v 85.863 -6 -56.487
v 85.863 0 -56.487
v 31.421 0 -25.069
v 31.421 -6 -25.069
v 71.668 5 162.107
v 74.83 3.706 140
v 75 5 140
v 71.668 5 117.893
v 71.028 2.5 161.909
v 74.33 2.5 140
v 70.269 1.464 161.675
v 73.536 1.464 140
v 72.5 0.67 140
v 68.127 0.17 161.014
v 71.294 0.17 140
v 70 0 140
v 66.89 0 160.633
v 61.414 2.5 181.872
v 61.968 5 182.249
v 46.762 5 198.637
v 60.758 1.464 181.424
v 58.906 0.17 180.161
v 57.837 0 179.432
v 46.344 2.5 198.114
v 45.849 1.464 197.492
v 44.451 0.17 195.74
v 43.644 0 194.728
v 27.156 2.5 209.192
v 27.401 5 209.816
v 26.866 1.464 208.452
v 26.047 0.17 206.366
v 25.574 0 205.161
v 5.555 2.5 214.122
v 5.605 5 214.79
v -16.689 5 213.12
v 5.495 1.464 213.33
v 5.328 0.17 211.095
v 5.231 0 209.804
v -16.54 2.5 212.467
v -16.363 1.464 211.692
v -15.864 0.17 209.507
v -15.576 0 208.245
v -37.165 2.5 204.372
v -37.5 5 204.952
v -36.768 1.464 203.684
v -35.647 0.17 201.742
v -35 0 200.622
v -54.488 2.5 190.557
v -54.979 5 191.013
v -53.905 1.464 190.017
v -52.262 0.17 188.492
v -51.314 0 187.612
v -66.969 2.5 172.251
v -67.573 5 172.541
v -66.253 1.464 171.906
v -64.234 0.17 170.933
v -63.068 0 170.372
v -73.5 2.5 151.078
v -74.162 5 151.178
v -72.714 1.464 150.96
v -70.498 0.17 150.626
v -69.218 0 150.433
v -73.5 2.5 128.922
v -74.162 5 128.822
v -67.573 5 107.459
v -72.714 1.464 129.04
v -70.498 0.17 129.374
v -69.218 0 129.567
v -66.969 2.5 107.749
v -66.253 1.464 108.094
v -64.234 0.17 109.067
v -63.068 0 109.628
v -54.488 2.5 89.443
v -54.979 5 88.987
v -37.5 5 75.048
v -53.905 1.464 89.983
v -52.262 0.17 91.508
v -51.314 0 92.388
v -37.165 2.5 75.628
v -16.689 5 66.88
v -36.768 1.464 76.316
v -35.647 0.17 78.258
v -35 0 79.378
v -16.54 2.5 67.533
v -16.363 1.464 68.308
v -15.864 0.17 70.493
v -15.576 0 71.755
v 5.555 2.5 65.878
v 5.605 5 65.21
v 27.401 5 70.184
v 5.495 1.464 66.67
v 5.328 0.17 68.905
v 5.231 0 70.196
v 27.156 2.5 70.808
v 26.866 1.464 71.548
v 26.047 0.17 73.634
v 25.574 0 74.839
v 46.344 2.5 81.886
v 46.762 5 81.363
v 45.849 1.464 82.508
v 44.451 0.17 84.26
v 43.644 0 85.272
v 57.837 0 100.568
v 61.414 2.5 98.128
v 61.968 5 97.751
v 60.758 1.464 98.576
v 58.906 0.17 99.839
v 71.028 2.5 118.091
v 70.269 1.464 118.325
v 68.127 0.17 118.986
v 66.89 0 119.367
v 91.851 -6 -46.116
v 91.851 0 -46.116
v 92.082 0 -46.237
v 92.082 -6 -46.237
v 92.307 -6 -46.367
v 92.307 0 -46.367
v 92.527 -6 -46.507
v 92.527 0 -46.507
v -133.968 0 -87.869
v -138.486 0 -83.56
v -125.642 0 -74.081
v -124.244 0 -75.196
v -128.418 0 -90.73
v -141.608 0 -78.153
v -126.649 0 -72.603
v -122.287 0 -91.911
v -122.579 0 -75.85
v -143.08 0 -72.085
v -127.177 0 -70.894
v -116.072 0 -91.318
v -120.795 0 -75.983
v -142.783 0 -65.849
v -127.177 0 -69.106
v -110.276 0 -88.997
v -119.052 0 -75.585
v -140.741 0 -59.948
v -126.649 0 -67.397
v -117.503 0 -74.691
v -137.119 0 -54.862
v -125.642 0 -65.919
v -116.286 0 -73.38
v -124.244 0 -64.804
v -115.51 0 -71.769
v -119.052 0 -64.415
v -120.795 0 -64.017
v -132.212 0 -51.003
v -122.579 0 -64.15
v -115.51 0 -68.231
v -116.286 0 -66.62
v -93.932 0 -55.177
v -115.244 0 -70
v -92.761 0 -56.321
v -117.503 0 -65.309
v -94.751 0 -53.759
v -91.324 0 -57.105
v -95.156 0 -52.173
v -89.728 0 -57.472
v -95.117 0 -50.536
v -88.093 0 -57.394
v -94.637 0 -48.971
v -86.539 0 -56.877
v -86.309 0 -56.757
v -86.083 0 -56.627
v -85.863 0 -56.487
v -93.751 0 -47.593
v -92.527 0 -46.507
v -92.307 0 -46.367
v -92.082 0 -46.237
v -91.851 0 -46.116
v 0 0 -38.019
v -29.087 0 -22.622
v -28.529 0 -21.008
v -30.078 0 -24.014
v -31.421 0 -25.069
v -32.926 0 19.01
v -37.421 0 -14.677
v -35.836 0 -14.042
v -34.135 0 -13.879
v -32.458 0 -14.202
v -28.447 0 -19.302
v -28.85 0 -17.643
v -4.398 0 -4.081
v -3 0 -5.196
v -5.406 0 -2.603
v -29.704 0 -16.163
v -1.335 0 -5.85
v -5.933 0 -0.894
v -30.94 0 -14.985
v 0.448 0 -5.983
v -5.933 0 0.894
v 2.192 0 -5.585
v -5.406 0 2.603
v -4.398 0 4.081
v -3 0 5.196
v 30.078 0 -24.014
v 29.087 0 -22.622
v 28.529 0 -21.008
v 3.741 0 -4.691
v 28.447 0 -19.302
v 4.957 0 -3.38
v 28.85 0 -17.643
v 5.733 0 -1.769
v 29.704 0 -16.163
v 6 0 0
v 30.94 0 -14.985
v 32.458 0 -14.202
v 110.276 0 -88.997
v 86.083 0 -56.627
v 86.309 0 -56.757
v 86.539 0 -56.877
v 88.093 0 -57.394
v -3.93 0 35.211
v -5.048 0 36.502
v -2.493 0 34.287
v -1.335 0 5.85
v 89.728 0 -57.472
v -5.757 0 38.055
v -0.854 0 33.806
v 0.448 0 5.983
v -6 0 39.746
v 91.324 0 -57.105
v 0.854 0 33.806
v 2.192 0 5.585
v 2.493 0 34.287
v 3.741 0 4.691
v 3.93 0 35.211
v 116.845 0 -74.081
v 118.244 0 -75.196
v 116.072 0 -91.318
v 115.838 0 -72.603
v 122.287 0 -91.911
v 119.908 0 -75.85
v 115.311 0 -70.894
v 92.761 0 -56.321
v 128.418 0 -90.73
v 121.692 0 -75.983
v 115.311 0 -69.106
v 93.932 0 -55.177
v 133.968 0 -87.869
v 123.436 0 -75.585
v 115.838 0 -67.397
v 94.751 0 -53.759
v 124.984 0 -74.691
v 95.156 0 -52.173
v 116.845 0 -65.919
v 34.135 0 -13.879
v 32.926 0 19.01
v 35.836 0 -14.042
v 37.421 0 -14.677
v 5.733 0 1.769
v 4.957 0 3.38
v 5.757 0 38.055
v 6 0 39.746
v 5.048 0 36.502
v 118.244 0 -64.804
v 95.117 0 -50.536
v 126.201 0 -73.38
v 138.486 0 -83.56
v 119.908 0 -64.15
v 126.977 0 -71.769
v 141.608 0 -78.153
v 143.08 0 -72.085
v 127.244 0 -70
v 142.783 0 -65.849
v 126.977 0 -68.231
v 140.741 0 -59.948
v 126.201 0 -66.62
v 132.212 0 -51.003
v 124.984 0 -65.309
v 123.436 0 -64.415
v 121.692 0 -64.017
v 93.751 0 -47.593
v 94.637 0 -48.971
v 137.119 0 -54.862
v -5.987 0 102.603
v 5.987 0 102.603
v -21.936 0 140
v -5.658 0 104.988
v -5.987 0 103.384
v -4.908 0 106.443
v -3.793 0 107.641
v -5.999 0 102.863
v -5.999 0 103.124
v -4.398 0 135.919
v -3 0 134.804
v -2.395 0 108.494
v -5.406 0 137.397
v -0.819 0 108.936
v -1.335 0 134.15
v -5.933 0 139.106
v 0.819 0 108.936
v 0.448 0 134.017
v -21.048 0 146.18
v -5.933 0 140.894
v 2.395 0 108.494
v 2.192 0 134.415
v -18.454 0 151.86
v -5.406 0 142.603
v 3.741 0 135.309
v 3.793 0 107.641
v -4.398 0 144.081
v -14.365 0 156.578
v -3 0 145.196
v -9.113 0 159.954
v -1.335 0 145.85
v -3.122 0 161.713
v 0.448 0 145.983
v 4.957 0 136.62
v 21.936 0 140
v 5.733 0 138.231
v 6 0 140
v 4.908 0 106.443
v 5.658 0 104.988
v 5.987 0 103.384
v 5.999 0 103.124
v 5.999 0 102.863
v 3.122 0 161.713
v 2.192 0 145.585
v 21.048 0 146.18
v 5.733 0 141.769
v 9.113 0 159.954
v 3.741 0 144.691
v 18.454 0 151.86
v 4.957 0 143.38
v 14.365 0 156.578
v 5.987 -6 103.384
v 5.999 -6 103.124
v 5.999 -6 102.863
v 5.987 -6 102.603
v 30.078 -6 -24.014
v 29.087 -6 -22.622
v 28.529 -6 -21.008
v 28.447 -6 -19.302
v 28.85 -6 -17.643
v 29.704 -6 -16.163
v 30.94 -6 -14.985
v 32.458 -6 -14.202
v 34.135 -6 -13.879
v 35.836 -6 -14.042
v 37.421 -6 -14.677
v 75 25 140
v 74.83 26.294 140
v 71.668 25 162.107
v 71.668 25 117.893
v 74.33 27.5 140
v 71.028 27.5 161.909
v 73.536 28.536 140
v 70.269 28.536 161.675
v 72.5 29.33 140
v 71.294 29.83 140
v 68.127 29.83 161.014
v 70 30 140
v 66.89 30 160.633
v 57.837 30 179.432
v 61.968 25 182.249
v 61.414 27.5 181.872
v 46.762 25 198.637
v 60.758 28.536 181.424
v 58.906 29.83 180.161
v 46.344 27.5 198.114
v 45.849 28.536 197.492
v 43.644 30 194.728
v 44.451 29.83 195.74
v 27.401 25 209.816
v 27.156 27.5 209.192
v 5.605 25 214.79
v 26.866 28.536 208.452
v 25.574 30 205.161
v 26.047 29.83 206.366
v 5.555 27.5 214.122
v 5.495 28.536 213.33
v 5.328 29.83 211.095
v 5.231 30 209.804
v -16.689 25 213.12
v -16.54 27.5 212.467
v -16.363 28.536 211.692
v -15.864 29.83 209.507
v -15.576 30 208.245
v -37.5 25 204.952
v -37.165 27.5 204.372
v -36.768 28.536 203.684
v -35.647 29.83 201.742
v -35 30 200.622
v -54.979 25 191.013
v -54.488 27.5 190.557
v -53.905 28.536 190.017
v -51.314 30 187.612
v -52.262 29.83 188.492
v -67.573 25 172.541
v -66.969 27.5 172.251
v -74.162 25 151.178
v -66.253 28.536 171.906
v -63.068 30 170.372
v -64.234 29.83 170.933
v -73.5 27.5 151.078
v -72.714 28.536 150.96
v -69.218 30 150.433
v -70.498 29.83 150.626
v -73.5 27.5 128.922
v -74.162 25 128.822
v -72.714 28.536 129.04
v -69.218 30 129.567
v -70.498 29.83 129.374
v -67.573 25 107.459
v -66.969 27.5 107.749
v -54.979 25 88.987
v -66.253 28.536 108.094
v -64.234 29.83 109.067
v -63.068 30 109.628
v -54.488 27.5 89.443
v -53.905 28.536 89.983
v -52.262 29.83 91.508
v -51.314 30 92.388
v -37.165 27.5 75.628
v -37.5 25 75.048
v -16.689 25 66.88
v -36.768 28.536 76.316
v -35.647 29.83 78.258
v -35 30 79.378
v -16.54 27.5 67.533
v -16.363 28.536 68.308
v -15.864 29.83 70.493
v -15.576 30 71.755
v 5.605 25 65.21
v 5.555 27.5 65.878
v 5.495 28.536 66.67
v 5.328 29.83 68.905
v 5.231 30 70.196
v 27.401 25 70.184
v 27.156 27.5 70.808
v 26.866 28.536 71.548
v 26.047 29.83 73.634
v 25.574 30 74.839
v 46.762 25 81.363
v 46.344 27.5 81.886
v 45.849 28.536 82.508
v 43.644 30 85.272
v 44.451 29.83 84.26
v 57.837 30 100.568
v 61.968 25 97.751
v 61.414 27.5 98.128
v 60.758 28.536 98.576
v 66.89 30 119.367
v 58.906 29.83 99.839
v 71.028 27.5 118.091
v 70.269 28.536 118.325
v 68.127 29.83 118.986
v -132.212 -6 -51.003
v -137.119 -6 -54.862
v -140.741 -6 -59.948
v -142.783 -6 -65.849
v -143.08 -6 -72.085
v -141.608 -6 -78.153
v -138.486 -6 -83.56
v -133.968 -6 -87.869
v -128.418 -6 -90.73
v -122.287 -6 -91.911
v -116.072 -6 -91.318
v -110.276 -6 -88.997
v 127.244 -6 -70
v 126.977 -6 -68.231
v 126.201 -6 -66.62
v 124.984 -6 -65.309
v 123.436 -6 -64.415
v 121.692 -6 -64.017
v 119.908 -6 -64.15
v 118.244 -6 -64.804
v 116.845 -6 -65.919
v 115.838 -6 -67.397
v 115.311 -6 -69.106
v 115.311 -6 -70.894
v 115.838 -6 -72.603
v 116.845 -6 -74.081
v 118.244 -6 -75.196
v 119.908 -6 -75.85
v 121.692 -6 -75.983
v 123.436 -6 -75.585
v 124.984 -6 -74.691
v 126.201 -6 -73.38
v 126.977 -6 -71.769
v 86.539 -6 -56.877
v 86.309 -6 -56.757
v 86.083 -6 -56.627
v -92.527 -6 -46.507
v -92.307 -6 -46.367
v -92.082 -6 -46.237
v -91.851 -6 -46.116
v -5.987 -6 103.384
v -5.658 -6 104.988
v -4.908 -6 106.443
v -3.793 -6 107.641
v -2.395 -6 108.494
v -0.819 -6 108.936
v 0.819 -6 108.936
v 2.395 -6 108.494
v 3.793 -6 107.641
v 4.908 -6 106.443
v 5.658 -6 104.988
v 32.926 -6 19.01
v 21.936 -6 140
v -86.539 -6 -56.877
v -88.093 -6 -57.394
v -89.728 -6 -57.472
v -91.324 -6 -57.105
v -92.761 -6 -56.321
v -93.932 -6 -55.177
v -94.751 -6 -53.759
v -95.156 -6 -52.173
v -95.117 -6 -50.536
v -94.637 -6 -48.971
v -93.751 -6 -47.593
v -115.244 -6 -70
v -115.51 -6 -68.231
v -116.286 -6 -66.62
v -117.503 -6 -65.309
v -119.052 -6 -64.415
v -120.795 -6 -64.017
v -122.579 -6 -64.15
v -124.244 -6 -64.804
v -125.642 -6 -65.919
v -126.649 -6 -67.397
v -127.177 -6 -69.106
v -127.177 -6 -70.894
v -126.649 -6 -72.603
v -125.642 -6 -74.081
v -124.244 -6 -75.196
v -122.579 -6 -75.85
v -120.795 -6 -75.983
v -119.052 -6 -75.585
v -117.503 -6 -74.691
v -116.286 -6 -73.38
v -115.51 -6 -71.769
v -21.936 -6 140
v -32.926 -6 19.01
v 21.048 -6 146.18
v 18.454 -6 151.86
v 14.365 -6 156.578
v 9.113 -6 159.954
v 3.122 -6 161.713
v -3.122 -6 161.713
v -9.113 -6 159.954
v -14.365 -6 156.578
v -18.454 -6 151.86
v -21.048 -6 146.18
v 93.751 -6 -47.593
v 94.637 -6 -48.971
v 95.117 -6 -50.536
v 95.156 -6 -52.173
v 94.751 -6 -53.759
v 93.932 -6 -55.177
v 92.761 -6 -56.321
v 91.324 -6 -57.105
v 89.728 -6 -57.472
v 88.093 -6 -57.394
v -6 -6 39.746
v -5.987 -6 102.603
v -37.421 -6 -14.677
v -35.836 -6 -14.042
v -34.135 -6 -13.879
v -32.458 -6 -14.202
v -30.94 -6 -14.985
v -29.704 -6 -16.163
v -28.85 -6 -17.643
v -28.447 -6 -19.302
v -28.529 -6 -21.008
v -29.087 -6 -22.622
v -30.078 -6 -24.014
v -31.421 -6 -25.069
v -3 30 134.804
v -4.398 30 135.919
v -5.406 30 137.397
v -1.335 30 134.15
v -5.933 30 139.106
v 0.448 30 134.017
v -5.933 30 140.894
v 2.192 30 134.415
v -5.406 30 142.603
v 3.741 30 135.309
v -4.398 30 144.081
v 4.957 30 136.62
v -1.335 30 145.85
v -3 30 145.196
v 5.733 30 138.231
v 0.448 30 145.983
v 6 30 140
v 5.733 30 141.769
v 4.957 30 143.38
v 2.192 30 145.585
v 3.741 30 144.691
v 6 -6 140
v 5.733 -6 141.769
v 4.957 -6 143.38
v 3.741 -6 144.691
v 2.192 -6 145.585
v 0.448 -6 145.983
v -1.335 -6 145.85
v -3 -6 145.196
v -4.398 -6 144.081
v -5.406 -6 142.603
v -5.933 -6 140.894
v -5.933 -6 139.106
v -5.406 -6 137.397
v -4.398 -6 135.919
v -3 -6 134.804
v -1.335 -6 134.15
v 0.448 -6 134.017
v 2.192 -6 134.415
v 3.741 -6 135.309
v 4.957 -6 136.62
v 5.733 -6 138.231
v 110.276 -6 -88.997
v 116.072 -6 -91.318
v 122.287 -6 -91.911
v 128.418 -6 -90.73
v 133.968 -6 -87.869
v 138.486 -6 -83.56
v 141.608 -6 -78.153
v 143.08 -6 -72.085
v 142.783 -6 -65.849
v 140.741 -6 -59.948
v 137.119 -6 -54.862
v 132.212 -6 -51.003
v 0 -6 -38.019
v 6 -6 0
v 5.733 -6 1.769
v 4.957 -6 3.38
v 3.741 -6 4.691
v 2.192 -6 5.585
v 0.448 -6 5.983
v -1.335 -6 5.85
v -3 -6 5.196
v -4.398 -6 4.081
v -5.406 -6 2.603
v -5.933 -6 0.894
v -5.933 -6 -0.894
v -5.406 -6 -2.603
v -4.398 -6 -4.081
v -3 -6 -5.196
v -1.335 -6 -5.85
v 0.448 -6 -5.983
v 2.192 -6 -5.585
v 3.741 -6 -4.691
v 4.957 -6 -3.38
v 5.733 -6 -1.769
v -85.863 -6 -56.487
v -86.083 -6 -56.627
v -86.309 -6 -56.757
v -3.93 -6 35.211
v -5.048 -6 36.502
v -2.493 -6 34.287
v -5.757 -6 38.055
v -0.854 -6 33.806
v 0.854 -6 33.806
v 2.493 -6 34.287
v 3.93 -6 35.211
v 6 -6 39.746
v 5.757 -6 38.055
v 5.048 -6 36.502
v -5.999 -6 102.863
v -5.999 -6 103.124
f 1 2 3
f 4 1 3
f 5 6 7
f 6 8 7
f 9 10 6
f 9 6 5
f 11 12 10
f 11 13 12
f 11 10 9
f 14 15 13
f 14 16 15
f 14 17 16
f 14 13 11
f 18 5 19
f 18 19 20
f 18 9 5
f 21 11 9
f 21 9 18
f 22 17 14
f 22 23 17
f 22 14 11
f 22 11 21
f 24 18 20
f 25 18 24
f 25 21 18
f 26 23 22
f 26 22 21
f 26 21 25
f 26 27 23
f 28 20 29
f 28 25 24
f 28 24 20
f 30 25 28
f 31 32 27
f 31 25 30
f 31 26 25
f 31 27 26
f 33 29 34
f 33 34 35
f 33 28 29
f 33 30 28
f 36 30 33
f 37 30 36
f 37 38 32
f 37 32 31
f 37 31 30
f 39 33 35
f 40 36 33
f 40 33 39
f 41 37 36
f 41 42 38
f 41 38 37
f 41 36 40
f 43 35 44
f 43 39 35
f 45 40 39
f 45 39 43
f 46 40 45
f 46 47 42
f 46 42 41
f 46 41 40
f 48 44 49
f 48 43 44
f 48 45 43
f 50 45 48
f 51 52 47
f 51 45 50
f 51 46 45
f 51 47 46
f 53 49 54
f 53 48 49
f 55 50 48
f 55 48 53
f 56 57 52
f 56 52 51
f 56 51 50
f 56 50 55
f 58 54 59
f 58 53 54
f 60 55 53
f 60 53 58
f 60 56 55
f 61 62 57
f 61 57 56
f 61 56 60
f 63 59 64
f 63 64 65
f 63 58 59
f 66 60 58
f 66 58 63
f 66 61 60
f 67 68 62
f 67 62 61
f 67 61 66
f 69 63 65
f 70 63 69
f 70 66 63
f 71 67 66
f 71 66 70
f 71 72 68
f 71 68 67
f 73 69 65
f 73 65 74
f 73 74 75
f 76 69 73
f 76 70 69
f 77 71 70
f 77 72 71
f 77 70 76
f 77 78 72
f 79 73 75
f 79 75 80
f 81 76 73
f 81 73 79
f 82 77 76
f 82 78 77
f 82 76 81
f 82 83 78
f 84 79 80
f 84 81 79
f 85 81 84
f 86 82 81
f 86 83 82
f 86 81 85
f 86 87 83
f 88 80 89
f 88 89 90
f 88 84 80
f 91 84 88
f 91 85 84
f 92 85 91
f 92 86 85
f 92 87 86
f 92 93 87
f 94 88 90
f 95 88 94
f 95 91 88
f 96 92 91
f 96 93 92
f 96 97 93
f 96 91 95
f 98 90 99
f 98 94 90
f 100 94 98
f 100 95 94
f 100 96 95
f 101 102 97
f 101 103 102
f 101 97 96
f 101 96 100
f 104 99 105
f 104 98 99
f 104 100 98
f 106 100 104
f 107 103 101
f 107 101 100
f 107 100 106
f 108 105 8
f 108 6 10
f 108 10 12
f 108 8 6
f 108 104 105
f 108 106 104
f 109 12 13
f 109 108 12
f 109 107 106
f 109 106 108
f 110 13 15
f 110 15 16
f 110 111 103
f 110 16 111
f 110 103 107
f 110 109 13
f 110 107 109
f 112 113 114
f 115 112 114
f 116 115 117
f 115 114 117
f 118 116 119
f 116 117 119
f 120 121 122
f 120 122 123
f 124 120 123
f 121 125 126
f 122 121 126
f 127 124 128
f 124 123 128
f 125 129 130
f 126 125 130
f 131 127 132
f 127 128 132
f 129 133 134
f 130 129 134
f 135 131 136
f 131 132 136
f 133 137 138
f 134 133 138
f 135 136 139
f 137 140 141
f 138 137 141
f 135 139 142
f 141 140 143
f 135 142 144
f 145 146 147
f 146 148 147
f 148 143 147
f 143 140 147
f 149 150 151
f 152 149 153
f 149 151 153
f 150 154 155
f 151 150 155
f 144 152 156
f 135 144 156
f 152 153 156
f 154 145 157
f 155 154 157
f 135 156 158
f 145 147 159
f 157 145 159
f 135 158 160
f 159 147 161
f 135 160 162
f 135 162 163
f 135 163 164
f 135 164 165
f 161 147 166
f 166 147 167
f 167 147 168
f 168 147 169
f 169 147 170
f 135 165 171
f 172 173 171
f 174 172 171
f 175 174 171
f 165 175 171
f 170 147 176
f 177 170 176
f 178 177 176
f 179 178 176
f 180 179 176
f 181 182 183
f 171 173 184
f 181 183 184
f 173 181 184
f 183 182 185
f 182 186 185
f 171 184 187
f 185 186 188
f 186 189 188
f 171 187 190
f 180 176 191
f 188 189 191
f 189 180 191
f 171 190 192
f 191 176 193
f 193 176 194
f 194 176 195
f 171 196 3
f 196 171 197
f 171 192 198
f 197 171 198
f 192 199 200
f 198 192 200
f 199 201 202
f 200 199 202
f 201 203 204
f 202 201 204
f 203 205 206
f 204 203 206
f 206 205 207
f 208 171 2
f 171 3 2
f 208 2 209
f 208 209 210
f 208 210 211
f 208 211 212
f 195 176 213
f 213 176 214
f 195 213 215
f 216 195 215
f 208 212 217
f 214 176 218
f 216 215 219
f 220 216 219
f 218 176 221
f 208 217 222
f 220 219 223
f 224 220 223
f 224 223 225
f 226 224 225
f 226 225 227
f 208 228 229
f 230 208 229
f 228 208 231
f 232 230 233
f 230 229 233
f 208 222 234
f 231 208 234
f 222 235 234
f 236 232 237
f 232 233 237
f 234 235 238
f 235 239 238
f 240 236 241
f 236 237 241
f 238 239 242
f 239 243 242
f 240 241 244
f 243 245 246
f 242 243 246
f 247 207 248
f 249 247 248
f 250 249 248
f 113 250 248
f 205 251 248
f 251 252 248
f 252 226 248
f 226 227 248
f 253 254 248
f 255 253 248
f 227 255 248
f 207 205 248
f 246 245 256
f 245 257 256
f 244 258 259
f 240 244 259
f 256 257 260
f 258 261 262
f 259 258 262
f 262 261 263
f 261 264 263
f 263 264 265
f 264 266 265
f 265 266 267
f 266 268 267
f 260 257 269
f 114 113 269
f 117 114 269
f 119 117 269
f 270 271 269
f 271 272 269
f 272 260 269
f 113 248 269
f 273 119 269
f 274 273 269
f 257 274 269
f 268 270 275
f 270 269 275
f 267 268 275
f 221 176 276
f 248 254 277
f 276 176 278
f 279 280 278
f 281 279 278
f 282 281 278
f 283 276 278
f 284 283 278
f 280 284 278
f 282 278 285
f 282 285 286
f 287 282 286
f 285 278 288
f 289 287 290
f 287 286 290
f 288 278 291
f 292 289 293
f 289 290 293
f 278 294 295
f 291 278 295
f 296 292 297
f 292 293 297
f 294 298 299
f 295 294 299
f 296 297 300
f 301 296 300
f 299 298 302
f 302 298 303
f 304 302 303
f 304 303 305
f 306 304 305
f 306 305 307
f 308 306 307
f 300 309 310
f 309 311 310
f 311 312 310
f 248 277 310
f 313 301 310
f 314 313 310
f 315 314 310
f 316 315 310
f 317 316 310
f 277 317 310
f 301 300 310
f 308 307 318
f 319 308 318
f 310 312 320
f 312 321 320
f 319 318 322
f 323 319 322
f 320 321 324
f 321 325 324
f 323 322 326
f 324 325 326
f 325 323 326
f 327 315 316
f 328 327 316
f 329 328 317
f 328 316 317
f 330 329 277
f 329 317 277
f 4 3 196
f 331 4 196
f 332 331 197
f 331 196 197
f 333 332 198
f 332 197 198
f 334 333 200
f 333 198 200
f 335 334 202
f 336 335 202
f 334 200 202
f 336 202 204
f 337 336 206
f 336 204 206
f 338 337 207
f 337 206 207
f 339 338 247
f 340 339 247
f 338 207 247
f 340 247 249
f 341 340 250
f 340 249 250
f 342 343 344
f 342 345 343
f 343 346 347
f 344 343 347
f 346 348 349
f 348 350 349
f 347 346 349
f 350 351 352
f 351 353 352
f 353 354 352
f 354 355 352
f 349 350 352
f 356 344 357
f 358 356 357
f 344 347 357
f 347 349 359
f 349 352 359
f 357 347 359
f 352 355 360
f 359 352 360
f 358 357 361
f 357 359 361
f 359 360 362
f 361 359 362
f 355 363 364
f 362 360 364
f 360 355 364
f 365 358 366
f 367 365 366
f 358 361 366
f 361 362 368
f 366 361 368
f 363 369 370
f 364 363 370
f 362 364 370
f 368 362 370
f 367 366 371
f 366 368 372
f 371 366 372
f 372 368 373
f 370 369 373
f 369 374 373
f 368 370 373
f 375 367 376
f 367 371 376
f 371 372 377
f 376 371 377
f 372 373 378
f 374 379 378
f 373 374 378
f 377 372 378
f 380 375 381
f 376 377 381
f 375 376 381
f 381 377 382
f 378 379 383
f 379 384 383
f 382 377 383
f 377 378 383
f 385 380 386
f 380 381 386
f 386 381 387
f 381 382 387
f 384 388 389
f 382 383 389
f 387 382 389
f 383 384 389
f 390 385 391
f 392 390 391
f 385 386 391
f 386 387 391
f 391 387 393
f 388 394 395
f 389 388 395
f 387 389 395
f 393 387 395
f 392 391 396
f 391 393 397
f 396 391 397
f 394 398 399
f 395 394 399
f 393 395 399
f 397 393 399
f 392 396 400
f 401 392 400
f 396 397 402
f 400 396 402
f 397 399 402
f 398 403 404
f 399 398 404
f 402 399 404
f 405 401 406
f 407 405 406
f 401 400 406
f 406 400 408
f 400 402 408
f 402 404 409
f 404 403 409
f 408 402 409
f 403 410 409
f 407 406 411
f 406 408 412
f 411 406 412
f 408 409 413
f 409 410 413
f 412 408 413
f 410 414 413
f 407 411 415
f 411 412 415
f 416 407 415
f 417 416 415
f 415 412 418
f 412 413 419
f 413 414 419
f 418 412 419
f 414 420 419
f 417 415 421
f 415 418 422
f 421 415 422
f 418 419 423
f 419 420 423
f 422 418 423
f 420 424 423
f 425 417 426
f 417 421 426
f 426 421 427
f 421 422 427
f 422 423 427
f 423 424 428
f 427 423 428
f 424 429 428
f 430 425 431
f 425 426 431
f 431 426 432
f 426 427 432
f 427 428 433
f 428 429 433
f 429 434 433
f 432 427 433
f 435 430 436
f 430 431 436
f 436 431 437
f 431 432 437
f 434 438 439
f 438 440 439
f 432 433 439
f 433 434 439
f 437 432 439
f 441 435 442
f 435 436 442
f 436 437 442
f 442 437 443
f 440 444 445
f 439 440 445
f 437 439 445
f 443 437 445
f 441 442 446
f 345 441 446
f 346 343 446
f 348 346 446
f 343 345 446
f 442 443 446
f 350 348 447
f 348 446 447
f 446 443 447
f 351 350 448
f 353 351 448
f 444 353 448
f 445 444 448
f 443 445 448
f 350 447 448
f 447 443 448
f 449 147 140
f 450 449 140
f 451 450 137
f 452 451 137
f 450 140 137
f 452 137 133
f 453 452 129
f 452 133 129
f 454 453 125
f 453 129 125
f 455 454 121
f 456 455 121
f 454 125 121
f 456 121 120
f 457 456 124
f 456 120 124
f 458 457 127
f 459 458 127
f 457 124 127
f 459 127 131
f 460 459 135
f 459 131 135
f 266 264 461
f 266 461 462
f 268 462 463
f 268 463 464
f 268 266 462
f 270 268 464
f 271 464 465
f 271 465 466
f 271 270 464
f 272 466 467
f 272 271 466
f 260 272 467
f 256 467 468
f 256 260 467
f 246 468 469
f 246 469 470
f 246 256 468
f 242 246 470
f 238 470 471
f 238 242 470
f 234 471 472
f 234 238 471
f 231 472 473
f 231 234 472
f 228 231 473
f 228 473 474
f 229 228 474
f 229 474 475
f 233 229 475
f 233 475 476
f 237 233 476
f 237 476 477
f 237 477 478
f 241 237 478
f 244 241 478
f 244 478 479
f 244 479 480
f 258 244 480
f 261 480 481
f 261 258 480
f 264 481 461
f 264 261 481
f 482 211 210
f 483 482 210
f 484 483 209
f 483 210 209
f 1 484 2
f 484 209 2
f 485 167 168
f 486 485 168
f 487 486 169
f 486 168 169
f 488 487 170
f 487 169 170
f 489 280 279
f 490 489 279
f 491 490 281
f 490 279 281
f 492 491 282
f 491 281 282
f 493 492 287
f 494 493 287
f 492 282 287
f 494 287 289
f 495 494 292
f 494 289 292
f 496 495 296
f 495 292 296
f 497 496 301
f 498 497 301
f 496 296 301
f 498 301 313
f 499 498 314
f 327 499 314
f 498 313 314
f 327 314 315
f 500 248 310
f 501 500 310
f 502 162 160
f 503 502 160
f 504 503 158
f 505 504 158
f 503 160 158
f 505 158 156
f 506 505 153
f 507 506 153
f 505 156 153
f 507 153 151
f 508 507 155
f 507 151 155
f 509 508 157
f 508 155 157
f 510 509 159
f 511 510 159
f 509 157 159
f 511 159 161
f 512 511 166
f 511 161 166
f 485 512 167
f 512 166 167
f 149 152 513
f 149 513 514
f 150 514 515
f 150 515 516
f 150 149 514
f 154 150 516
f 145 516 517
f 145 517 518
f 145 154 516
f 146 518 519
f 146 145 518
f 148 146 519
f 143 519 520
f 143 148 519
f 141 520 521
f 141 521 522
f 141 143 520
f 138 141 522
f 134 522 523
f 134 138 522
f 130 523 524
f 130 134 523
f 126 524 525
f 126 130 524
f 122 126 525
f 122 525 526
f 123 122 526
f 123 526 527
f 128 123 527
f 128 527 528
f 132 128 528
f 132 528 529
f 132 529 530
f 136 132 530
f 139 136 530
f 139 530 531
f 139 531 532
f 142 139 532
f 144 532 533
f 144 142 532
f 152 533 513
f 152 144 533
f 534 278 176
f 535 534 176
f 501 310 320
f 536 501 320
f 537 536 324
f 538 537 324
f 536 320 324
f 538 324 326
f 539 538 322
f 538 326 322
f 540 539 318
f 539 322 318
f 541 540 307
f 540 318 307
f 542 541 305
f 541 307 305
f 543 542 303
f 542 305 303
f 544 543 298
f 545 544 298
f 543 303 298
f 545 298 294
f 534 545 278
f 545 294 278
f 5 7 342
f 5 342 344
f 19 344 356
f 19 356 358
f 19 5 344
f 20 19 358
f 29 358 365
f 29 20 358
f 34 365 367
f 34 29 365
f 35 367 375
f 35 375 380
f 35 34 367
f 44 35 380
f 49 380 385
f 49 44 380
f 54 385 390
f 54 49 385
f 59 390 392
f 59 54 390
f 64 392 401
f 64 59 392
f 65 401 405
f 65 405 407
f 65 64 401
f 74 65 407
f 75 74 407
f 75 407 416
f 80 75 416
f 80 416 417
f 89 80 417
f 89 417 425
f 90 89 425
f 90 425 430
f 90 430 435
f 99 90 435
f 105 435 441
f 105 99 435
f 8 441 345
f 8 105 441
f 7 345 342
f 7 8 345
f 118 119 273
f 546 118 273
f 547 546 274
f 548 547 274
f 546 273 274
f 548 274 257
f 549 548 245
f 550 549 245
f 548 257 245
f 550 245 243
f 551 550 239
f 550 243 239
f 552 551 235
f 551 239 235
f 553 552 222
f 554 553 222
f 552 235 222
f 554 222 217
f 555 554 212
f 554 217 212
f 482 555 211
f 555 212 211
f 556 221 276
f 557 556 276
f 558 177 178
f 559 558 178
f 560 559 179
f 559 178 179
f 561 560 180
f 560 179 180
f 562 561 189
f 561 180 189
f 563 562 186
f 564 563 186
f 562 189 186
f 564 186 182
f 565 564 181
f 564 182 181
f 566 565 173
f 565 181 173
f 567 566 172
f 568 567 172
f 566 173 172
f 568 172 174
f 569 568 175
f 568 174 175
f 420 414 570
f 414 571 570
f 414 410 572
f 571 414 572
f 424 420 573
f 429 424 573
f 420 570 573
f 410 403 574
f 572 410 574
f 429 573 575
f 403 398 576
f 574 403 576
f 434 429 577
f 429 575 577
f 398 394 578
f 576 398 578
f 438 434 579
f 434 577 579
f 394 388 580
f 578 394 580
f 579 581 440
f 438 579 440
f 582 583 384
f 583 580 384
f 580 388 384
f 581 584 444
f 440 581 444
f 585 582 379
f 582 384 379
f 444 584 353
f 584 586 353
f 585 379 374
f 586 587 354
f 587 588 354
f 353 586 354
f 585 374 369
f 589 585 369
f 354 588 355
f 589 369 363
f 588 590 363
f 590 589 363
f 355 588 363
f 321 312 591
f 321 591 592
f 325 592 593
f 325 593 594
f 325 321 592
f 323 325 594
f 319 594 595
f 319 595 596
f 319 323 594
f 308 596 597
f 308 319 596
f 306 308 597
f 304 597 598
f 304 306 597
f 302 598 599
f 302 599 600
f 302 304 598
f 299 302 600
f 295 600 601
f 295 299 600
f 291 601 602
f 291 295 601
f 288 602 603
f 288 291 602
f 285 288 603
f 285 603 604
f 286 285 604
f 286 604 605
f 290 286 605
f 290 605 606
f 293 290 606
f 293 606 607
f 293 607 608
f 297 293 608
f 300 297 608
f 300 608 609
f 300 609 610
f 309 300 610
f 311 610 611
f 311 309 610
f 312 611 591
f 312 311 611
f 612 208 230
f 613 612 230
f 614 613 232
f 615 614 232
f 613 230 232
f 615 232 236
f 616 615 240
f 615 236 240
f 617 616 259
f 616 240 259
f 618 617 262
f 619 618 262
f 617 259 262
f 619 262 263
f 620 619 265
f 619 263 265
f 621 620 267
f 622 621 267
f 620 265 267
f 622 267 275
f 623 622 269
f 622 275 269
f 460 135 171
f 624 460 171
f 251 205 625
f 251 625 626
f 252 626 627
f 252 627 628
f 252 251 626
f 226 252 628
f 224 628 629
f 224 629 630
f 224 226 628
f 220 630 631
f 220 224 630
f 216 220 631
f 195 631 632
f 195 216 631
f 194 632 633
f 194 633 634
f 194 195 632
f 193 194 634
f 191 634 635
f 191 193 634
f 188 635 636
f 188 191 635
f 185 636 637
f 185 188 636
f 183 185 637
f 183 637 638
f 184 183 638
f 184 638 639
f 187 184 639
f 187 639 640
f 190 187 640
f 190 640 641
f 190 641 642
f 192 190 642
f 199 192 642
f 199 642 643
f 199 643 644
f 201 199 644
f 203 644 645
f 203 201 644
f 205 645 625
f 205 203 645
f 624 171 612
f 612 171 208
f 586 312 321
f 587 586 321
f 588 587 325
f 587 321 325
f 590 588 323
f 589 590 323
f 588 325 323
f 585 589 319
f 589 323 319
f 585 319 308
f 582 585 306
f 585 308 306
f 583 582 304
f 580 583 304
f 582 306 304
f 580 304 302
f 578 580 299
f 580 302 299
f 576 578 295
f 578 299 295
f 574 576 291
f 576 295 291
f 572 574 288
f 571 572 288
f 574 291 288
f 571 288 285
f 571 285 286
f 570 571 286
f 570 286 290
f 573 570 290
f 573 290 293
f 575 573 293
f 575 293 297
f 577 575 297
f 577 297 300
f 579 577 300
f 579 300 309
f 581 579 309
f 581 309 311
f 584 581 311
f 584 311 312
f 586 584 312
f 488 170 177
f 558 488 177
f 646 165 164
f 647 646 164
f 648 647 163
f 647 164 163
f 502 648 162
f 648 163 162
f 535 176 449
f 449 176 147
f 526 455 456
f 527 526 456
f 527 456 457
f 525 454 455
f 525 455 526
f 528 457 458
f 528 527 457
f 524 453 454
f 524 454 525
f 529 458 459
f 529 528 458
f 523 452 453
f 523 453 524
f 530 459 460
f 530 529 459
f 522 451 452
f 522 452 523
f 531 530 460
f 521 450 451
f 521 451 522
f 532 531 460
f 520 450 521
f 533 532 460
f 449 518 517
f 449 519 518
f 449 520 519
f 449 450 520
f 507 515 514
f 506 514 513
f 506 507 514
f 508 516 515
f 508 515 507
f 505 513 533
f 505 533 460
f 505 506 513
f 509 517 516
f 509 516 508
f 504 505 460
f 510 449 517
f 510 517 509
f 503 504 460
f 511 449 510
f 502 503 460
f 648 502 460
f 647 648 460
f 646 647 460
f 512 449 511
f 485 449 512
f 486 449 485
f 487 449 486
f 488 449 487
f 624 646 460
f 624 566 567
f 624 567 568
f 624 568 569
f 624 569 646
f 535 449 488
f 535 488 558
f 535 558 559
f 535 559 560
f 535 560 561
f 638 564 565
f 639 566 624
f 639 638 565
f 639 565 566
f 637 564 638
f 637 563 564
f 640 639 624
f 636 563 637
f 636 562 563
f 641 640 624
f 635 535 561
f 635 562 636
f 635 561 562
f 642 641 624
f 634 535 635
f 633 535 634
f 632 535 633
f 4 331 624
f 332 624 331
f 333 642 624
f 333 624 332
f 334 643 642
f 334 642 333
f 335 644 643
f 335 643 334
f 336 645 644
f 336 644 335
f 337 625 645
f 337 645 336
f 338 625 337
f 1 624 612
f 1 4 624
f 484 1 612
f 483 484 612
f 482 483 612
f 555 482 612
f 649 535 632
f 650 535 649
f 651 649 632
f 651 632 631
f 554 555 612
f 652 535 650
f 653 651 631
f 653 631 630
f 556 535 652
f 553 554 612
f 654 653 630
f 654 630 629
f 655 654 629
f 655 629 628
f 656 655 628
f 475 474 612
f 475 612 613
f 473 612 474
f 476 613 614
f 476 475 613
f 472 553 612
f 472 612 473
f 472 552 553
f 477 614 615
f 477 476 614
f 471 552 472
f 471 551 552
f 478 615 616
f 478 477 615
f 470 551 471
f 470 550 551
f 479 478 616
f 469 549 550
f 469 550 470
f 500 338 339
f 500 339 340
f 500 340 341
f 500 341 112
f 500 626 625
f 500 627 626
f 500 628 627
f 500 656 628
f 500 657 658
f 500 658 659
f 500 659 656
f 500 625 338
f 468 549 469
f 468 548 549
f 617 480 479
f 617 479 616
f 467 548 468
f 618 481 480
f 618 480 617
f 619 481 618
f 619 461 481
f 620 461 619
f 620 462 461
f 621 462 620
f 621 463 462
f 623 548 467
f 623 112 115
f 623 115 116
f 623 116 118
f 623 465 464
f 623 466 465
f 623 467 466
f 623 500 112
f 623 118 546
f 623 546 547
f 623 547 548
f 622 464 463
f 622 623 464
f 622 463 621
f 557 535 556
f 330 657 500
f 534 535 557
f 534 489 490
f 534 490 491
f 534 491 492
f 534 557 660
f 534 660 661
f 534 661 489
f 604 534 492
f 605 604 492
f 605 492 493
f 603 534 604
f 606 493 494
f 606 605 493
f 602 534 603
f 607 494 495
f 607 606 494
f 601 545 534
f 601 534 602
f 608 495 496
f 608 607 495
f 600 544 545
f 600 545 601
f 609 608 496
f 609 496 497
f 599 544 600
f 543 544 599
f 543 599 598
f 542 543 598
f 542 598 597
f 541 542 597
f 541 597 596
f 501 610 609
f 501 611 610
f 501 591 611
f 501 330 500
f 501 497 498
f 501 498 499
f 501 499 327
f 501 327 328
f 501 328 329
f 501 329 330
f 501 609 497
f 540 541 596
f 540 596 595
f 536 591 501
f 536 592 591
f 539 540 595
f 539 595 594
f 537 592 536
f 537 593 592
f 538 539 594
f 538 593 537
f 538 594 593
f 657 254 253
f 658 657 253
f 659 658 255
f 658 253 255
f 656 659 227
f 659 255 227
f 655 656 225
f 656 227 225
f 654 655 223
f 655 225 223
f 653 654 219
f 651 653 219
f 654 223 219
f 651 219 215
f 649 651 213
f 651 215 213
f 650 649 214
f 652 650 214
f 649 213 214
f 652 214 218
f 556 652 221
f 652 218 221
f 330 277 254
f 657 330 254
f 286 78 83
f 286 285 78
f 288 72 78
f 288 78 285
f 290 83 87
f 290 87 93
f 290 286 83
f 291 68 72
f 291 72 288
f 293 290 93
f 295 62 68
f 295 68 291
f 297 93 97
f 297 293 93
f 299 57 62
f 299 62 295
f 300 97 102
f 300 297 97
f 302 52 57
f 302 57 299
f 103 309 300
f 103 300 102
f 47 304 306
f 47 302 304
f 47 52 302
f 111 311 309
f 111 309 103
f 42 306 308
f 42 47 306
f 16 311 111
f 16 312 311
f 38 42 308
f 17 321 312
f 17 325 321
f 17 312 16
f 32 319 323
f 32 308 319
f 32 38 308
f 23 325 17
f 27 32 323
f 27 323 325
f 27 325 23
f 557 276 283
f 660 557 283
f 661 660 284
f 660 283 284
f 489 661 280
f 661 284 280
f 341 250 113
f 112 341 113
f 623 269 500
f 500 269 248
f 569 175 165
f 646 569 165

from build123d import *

# Parameters (mm, degrees)
F0_R     = 6
F1_DEPTH = 6
F2_R     = 75
F3_DEPTH = 30
F4_R     = 5
F5_DEPTH = 30.001


with BuildPart() as f1:
    # F0 (on Front) → F1 (new body)
    with BuildSketch(Plane.XZ):
        with BuildLine():
            Line((32.925511, 19.009553), (21.936078, 140))
            ThreePointArc((21.936078, 140), (0, 161.936078), (-21.936078, 140))
            Line((-21.936078, 140), (-32.925511, 19.009553))
            Line((-32.925511, 19.009553), (-132.211596, -51.002799))
            ThreePointArc((-132.211596, -51.002799), (-140.240758, -80.968039), (-110.275517, -88.997201))
            Line((-110.275517, -88.997201), (0, -38.019105))
            Line((0, -38.019105), (110.275517, -88.997201))
            ThreePointArc((110.275517, -88.997201), (140.240758, -80.968039), (132.211596, -51.002799))
            Line((132.211596, -51.002799), (32.925511, 19.009553))
        make_face()
        with Locations((-121.243557, -70)):
            Circle(F0_R, mode=Mode.SUBTRACT)
        with BuildLine():
            ThreePointArc((-92.526661, -46.506851), (-92.195079, -46.300651), (-91.850787, -46.116454))
            Line((-91.850787, -46.116454), (-37.421071, -14.676862))
            ThreePointArc((-37.421071, -14.676862), (-29.223875, -16.872412), (-31.421071, -25.069167))
            Line((-31.421071, -25.069167), (-85.863414, -56.486888))
            ThreePointArc((-85.863414, -56.486888), (-86.195079, -56.692955), (-86.539445, -56.877014))
            ThreePointArc((-86.539445, -56.877014), (-94.390188, -54.4962), (-92.526661, -46.506851))
        make_face(mode=Mode.SUBTRACT)
        Circle(F0_R, mode=Mode.SUBTRACT)
        with BuildLine():
            ThreePointArc((86.539445, -56.877014), (86.195079, -56.692955), (85.863414, -56.486888))
            Line((85.863414, -56.486888), (31.421071, -25.069167))
            ThreePointArc((31.421071, -25.069167), (29.223875, -16.872412), (37.421071, -14.676862))
            Line((37.421071, -14.676862), (91.850787, -46.116454))
            ThreePointArc((91.850787, -46.116454), (92.195079, -46.300651), (92.526661, -46.506851))
            ThreePointArc((92.526661, -46.506851), (94.390188, -54.4962), (86.539445, -56.877014))
        make_face(mode=Mode.SUBTRACT)
        with Locations((121.243557, -70)):
            Circle(F0_R, mode=Mode.SUBTRACT)
        with BuildLine():
            ThreePointArc((5.987216, 103.383865), (6, 102.993606), (5.987373, 102.603342))
            Line((5.987373, 102.603342), (6, 39.746029))
            ThreePointArc((6, 39.746029), (0, 33.744824), (-6, 39.746029))
            Line((-6, 39.746029), (-5.987373, 102.603342))
            ThreePointArc((-5.987373, 102.603342), (-6, 102.993606), (-5.987216, 103.383865))
            ThreePointArc((-5.987216, 103.383865), (0, 108.992401), (5.987216, 103.383865))
        make_face(mode=Mode.SUBTRACT)
        with Locations((0, 140)):
            Circle(F0_R, mode=Mode.SUBTRACT)
    extrude(amount=F1_DEPTH)


with BuildPart() as f3:
    # F2 (on face) → F3 (new body)
    with BuildSketch(Plane.XZ):
        with Locations((0, 140)):
            Circle(F2_R)
    extrude(amount=-F3_DEPTH)

    # F4
    f4_edges = [f3.edges().sort_by_distance(p)[0] for p in [
        (-75, 0, 140),
        (-75, 30, 140),
    ]]
    fillet(f4_edges, radius=F4_R)

    # F0 (on Front) → F5 (cut, through all)
    with BuildSketch(Plane.XZ):
        with Locations((0, 140)):
            Circle(F0_R)
    extrude(amount=-F5_DEPTH, mode=Mode.SUBTRACT)


solid = Compound([f1.part, f3.part])
